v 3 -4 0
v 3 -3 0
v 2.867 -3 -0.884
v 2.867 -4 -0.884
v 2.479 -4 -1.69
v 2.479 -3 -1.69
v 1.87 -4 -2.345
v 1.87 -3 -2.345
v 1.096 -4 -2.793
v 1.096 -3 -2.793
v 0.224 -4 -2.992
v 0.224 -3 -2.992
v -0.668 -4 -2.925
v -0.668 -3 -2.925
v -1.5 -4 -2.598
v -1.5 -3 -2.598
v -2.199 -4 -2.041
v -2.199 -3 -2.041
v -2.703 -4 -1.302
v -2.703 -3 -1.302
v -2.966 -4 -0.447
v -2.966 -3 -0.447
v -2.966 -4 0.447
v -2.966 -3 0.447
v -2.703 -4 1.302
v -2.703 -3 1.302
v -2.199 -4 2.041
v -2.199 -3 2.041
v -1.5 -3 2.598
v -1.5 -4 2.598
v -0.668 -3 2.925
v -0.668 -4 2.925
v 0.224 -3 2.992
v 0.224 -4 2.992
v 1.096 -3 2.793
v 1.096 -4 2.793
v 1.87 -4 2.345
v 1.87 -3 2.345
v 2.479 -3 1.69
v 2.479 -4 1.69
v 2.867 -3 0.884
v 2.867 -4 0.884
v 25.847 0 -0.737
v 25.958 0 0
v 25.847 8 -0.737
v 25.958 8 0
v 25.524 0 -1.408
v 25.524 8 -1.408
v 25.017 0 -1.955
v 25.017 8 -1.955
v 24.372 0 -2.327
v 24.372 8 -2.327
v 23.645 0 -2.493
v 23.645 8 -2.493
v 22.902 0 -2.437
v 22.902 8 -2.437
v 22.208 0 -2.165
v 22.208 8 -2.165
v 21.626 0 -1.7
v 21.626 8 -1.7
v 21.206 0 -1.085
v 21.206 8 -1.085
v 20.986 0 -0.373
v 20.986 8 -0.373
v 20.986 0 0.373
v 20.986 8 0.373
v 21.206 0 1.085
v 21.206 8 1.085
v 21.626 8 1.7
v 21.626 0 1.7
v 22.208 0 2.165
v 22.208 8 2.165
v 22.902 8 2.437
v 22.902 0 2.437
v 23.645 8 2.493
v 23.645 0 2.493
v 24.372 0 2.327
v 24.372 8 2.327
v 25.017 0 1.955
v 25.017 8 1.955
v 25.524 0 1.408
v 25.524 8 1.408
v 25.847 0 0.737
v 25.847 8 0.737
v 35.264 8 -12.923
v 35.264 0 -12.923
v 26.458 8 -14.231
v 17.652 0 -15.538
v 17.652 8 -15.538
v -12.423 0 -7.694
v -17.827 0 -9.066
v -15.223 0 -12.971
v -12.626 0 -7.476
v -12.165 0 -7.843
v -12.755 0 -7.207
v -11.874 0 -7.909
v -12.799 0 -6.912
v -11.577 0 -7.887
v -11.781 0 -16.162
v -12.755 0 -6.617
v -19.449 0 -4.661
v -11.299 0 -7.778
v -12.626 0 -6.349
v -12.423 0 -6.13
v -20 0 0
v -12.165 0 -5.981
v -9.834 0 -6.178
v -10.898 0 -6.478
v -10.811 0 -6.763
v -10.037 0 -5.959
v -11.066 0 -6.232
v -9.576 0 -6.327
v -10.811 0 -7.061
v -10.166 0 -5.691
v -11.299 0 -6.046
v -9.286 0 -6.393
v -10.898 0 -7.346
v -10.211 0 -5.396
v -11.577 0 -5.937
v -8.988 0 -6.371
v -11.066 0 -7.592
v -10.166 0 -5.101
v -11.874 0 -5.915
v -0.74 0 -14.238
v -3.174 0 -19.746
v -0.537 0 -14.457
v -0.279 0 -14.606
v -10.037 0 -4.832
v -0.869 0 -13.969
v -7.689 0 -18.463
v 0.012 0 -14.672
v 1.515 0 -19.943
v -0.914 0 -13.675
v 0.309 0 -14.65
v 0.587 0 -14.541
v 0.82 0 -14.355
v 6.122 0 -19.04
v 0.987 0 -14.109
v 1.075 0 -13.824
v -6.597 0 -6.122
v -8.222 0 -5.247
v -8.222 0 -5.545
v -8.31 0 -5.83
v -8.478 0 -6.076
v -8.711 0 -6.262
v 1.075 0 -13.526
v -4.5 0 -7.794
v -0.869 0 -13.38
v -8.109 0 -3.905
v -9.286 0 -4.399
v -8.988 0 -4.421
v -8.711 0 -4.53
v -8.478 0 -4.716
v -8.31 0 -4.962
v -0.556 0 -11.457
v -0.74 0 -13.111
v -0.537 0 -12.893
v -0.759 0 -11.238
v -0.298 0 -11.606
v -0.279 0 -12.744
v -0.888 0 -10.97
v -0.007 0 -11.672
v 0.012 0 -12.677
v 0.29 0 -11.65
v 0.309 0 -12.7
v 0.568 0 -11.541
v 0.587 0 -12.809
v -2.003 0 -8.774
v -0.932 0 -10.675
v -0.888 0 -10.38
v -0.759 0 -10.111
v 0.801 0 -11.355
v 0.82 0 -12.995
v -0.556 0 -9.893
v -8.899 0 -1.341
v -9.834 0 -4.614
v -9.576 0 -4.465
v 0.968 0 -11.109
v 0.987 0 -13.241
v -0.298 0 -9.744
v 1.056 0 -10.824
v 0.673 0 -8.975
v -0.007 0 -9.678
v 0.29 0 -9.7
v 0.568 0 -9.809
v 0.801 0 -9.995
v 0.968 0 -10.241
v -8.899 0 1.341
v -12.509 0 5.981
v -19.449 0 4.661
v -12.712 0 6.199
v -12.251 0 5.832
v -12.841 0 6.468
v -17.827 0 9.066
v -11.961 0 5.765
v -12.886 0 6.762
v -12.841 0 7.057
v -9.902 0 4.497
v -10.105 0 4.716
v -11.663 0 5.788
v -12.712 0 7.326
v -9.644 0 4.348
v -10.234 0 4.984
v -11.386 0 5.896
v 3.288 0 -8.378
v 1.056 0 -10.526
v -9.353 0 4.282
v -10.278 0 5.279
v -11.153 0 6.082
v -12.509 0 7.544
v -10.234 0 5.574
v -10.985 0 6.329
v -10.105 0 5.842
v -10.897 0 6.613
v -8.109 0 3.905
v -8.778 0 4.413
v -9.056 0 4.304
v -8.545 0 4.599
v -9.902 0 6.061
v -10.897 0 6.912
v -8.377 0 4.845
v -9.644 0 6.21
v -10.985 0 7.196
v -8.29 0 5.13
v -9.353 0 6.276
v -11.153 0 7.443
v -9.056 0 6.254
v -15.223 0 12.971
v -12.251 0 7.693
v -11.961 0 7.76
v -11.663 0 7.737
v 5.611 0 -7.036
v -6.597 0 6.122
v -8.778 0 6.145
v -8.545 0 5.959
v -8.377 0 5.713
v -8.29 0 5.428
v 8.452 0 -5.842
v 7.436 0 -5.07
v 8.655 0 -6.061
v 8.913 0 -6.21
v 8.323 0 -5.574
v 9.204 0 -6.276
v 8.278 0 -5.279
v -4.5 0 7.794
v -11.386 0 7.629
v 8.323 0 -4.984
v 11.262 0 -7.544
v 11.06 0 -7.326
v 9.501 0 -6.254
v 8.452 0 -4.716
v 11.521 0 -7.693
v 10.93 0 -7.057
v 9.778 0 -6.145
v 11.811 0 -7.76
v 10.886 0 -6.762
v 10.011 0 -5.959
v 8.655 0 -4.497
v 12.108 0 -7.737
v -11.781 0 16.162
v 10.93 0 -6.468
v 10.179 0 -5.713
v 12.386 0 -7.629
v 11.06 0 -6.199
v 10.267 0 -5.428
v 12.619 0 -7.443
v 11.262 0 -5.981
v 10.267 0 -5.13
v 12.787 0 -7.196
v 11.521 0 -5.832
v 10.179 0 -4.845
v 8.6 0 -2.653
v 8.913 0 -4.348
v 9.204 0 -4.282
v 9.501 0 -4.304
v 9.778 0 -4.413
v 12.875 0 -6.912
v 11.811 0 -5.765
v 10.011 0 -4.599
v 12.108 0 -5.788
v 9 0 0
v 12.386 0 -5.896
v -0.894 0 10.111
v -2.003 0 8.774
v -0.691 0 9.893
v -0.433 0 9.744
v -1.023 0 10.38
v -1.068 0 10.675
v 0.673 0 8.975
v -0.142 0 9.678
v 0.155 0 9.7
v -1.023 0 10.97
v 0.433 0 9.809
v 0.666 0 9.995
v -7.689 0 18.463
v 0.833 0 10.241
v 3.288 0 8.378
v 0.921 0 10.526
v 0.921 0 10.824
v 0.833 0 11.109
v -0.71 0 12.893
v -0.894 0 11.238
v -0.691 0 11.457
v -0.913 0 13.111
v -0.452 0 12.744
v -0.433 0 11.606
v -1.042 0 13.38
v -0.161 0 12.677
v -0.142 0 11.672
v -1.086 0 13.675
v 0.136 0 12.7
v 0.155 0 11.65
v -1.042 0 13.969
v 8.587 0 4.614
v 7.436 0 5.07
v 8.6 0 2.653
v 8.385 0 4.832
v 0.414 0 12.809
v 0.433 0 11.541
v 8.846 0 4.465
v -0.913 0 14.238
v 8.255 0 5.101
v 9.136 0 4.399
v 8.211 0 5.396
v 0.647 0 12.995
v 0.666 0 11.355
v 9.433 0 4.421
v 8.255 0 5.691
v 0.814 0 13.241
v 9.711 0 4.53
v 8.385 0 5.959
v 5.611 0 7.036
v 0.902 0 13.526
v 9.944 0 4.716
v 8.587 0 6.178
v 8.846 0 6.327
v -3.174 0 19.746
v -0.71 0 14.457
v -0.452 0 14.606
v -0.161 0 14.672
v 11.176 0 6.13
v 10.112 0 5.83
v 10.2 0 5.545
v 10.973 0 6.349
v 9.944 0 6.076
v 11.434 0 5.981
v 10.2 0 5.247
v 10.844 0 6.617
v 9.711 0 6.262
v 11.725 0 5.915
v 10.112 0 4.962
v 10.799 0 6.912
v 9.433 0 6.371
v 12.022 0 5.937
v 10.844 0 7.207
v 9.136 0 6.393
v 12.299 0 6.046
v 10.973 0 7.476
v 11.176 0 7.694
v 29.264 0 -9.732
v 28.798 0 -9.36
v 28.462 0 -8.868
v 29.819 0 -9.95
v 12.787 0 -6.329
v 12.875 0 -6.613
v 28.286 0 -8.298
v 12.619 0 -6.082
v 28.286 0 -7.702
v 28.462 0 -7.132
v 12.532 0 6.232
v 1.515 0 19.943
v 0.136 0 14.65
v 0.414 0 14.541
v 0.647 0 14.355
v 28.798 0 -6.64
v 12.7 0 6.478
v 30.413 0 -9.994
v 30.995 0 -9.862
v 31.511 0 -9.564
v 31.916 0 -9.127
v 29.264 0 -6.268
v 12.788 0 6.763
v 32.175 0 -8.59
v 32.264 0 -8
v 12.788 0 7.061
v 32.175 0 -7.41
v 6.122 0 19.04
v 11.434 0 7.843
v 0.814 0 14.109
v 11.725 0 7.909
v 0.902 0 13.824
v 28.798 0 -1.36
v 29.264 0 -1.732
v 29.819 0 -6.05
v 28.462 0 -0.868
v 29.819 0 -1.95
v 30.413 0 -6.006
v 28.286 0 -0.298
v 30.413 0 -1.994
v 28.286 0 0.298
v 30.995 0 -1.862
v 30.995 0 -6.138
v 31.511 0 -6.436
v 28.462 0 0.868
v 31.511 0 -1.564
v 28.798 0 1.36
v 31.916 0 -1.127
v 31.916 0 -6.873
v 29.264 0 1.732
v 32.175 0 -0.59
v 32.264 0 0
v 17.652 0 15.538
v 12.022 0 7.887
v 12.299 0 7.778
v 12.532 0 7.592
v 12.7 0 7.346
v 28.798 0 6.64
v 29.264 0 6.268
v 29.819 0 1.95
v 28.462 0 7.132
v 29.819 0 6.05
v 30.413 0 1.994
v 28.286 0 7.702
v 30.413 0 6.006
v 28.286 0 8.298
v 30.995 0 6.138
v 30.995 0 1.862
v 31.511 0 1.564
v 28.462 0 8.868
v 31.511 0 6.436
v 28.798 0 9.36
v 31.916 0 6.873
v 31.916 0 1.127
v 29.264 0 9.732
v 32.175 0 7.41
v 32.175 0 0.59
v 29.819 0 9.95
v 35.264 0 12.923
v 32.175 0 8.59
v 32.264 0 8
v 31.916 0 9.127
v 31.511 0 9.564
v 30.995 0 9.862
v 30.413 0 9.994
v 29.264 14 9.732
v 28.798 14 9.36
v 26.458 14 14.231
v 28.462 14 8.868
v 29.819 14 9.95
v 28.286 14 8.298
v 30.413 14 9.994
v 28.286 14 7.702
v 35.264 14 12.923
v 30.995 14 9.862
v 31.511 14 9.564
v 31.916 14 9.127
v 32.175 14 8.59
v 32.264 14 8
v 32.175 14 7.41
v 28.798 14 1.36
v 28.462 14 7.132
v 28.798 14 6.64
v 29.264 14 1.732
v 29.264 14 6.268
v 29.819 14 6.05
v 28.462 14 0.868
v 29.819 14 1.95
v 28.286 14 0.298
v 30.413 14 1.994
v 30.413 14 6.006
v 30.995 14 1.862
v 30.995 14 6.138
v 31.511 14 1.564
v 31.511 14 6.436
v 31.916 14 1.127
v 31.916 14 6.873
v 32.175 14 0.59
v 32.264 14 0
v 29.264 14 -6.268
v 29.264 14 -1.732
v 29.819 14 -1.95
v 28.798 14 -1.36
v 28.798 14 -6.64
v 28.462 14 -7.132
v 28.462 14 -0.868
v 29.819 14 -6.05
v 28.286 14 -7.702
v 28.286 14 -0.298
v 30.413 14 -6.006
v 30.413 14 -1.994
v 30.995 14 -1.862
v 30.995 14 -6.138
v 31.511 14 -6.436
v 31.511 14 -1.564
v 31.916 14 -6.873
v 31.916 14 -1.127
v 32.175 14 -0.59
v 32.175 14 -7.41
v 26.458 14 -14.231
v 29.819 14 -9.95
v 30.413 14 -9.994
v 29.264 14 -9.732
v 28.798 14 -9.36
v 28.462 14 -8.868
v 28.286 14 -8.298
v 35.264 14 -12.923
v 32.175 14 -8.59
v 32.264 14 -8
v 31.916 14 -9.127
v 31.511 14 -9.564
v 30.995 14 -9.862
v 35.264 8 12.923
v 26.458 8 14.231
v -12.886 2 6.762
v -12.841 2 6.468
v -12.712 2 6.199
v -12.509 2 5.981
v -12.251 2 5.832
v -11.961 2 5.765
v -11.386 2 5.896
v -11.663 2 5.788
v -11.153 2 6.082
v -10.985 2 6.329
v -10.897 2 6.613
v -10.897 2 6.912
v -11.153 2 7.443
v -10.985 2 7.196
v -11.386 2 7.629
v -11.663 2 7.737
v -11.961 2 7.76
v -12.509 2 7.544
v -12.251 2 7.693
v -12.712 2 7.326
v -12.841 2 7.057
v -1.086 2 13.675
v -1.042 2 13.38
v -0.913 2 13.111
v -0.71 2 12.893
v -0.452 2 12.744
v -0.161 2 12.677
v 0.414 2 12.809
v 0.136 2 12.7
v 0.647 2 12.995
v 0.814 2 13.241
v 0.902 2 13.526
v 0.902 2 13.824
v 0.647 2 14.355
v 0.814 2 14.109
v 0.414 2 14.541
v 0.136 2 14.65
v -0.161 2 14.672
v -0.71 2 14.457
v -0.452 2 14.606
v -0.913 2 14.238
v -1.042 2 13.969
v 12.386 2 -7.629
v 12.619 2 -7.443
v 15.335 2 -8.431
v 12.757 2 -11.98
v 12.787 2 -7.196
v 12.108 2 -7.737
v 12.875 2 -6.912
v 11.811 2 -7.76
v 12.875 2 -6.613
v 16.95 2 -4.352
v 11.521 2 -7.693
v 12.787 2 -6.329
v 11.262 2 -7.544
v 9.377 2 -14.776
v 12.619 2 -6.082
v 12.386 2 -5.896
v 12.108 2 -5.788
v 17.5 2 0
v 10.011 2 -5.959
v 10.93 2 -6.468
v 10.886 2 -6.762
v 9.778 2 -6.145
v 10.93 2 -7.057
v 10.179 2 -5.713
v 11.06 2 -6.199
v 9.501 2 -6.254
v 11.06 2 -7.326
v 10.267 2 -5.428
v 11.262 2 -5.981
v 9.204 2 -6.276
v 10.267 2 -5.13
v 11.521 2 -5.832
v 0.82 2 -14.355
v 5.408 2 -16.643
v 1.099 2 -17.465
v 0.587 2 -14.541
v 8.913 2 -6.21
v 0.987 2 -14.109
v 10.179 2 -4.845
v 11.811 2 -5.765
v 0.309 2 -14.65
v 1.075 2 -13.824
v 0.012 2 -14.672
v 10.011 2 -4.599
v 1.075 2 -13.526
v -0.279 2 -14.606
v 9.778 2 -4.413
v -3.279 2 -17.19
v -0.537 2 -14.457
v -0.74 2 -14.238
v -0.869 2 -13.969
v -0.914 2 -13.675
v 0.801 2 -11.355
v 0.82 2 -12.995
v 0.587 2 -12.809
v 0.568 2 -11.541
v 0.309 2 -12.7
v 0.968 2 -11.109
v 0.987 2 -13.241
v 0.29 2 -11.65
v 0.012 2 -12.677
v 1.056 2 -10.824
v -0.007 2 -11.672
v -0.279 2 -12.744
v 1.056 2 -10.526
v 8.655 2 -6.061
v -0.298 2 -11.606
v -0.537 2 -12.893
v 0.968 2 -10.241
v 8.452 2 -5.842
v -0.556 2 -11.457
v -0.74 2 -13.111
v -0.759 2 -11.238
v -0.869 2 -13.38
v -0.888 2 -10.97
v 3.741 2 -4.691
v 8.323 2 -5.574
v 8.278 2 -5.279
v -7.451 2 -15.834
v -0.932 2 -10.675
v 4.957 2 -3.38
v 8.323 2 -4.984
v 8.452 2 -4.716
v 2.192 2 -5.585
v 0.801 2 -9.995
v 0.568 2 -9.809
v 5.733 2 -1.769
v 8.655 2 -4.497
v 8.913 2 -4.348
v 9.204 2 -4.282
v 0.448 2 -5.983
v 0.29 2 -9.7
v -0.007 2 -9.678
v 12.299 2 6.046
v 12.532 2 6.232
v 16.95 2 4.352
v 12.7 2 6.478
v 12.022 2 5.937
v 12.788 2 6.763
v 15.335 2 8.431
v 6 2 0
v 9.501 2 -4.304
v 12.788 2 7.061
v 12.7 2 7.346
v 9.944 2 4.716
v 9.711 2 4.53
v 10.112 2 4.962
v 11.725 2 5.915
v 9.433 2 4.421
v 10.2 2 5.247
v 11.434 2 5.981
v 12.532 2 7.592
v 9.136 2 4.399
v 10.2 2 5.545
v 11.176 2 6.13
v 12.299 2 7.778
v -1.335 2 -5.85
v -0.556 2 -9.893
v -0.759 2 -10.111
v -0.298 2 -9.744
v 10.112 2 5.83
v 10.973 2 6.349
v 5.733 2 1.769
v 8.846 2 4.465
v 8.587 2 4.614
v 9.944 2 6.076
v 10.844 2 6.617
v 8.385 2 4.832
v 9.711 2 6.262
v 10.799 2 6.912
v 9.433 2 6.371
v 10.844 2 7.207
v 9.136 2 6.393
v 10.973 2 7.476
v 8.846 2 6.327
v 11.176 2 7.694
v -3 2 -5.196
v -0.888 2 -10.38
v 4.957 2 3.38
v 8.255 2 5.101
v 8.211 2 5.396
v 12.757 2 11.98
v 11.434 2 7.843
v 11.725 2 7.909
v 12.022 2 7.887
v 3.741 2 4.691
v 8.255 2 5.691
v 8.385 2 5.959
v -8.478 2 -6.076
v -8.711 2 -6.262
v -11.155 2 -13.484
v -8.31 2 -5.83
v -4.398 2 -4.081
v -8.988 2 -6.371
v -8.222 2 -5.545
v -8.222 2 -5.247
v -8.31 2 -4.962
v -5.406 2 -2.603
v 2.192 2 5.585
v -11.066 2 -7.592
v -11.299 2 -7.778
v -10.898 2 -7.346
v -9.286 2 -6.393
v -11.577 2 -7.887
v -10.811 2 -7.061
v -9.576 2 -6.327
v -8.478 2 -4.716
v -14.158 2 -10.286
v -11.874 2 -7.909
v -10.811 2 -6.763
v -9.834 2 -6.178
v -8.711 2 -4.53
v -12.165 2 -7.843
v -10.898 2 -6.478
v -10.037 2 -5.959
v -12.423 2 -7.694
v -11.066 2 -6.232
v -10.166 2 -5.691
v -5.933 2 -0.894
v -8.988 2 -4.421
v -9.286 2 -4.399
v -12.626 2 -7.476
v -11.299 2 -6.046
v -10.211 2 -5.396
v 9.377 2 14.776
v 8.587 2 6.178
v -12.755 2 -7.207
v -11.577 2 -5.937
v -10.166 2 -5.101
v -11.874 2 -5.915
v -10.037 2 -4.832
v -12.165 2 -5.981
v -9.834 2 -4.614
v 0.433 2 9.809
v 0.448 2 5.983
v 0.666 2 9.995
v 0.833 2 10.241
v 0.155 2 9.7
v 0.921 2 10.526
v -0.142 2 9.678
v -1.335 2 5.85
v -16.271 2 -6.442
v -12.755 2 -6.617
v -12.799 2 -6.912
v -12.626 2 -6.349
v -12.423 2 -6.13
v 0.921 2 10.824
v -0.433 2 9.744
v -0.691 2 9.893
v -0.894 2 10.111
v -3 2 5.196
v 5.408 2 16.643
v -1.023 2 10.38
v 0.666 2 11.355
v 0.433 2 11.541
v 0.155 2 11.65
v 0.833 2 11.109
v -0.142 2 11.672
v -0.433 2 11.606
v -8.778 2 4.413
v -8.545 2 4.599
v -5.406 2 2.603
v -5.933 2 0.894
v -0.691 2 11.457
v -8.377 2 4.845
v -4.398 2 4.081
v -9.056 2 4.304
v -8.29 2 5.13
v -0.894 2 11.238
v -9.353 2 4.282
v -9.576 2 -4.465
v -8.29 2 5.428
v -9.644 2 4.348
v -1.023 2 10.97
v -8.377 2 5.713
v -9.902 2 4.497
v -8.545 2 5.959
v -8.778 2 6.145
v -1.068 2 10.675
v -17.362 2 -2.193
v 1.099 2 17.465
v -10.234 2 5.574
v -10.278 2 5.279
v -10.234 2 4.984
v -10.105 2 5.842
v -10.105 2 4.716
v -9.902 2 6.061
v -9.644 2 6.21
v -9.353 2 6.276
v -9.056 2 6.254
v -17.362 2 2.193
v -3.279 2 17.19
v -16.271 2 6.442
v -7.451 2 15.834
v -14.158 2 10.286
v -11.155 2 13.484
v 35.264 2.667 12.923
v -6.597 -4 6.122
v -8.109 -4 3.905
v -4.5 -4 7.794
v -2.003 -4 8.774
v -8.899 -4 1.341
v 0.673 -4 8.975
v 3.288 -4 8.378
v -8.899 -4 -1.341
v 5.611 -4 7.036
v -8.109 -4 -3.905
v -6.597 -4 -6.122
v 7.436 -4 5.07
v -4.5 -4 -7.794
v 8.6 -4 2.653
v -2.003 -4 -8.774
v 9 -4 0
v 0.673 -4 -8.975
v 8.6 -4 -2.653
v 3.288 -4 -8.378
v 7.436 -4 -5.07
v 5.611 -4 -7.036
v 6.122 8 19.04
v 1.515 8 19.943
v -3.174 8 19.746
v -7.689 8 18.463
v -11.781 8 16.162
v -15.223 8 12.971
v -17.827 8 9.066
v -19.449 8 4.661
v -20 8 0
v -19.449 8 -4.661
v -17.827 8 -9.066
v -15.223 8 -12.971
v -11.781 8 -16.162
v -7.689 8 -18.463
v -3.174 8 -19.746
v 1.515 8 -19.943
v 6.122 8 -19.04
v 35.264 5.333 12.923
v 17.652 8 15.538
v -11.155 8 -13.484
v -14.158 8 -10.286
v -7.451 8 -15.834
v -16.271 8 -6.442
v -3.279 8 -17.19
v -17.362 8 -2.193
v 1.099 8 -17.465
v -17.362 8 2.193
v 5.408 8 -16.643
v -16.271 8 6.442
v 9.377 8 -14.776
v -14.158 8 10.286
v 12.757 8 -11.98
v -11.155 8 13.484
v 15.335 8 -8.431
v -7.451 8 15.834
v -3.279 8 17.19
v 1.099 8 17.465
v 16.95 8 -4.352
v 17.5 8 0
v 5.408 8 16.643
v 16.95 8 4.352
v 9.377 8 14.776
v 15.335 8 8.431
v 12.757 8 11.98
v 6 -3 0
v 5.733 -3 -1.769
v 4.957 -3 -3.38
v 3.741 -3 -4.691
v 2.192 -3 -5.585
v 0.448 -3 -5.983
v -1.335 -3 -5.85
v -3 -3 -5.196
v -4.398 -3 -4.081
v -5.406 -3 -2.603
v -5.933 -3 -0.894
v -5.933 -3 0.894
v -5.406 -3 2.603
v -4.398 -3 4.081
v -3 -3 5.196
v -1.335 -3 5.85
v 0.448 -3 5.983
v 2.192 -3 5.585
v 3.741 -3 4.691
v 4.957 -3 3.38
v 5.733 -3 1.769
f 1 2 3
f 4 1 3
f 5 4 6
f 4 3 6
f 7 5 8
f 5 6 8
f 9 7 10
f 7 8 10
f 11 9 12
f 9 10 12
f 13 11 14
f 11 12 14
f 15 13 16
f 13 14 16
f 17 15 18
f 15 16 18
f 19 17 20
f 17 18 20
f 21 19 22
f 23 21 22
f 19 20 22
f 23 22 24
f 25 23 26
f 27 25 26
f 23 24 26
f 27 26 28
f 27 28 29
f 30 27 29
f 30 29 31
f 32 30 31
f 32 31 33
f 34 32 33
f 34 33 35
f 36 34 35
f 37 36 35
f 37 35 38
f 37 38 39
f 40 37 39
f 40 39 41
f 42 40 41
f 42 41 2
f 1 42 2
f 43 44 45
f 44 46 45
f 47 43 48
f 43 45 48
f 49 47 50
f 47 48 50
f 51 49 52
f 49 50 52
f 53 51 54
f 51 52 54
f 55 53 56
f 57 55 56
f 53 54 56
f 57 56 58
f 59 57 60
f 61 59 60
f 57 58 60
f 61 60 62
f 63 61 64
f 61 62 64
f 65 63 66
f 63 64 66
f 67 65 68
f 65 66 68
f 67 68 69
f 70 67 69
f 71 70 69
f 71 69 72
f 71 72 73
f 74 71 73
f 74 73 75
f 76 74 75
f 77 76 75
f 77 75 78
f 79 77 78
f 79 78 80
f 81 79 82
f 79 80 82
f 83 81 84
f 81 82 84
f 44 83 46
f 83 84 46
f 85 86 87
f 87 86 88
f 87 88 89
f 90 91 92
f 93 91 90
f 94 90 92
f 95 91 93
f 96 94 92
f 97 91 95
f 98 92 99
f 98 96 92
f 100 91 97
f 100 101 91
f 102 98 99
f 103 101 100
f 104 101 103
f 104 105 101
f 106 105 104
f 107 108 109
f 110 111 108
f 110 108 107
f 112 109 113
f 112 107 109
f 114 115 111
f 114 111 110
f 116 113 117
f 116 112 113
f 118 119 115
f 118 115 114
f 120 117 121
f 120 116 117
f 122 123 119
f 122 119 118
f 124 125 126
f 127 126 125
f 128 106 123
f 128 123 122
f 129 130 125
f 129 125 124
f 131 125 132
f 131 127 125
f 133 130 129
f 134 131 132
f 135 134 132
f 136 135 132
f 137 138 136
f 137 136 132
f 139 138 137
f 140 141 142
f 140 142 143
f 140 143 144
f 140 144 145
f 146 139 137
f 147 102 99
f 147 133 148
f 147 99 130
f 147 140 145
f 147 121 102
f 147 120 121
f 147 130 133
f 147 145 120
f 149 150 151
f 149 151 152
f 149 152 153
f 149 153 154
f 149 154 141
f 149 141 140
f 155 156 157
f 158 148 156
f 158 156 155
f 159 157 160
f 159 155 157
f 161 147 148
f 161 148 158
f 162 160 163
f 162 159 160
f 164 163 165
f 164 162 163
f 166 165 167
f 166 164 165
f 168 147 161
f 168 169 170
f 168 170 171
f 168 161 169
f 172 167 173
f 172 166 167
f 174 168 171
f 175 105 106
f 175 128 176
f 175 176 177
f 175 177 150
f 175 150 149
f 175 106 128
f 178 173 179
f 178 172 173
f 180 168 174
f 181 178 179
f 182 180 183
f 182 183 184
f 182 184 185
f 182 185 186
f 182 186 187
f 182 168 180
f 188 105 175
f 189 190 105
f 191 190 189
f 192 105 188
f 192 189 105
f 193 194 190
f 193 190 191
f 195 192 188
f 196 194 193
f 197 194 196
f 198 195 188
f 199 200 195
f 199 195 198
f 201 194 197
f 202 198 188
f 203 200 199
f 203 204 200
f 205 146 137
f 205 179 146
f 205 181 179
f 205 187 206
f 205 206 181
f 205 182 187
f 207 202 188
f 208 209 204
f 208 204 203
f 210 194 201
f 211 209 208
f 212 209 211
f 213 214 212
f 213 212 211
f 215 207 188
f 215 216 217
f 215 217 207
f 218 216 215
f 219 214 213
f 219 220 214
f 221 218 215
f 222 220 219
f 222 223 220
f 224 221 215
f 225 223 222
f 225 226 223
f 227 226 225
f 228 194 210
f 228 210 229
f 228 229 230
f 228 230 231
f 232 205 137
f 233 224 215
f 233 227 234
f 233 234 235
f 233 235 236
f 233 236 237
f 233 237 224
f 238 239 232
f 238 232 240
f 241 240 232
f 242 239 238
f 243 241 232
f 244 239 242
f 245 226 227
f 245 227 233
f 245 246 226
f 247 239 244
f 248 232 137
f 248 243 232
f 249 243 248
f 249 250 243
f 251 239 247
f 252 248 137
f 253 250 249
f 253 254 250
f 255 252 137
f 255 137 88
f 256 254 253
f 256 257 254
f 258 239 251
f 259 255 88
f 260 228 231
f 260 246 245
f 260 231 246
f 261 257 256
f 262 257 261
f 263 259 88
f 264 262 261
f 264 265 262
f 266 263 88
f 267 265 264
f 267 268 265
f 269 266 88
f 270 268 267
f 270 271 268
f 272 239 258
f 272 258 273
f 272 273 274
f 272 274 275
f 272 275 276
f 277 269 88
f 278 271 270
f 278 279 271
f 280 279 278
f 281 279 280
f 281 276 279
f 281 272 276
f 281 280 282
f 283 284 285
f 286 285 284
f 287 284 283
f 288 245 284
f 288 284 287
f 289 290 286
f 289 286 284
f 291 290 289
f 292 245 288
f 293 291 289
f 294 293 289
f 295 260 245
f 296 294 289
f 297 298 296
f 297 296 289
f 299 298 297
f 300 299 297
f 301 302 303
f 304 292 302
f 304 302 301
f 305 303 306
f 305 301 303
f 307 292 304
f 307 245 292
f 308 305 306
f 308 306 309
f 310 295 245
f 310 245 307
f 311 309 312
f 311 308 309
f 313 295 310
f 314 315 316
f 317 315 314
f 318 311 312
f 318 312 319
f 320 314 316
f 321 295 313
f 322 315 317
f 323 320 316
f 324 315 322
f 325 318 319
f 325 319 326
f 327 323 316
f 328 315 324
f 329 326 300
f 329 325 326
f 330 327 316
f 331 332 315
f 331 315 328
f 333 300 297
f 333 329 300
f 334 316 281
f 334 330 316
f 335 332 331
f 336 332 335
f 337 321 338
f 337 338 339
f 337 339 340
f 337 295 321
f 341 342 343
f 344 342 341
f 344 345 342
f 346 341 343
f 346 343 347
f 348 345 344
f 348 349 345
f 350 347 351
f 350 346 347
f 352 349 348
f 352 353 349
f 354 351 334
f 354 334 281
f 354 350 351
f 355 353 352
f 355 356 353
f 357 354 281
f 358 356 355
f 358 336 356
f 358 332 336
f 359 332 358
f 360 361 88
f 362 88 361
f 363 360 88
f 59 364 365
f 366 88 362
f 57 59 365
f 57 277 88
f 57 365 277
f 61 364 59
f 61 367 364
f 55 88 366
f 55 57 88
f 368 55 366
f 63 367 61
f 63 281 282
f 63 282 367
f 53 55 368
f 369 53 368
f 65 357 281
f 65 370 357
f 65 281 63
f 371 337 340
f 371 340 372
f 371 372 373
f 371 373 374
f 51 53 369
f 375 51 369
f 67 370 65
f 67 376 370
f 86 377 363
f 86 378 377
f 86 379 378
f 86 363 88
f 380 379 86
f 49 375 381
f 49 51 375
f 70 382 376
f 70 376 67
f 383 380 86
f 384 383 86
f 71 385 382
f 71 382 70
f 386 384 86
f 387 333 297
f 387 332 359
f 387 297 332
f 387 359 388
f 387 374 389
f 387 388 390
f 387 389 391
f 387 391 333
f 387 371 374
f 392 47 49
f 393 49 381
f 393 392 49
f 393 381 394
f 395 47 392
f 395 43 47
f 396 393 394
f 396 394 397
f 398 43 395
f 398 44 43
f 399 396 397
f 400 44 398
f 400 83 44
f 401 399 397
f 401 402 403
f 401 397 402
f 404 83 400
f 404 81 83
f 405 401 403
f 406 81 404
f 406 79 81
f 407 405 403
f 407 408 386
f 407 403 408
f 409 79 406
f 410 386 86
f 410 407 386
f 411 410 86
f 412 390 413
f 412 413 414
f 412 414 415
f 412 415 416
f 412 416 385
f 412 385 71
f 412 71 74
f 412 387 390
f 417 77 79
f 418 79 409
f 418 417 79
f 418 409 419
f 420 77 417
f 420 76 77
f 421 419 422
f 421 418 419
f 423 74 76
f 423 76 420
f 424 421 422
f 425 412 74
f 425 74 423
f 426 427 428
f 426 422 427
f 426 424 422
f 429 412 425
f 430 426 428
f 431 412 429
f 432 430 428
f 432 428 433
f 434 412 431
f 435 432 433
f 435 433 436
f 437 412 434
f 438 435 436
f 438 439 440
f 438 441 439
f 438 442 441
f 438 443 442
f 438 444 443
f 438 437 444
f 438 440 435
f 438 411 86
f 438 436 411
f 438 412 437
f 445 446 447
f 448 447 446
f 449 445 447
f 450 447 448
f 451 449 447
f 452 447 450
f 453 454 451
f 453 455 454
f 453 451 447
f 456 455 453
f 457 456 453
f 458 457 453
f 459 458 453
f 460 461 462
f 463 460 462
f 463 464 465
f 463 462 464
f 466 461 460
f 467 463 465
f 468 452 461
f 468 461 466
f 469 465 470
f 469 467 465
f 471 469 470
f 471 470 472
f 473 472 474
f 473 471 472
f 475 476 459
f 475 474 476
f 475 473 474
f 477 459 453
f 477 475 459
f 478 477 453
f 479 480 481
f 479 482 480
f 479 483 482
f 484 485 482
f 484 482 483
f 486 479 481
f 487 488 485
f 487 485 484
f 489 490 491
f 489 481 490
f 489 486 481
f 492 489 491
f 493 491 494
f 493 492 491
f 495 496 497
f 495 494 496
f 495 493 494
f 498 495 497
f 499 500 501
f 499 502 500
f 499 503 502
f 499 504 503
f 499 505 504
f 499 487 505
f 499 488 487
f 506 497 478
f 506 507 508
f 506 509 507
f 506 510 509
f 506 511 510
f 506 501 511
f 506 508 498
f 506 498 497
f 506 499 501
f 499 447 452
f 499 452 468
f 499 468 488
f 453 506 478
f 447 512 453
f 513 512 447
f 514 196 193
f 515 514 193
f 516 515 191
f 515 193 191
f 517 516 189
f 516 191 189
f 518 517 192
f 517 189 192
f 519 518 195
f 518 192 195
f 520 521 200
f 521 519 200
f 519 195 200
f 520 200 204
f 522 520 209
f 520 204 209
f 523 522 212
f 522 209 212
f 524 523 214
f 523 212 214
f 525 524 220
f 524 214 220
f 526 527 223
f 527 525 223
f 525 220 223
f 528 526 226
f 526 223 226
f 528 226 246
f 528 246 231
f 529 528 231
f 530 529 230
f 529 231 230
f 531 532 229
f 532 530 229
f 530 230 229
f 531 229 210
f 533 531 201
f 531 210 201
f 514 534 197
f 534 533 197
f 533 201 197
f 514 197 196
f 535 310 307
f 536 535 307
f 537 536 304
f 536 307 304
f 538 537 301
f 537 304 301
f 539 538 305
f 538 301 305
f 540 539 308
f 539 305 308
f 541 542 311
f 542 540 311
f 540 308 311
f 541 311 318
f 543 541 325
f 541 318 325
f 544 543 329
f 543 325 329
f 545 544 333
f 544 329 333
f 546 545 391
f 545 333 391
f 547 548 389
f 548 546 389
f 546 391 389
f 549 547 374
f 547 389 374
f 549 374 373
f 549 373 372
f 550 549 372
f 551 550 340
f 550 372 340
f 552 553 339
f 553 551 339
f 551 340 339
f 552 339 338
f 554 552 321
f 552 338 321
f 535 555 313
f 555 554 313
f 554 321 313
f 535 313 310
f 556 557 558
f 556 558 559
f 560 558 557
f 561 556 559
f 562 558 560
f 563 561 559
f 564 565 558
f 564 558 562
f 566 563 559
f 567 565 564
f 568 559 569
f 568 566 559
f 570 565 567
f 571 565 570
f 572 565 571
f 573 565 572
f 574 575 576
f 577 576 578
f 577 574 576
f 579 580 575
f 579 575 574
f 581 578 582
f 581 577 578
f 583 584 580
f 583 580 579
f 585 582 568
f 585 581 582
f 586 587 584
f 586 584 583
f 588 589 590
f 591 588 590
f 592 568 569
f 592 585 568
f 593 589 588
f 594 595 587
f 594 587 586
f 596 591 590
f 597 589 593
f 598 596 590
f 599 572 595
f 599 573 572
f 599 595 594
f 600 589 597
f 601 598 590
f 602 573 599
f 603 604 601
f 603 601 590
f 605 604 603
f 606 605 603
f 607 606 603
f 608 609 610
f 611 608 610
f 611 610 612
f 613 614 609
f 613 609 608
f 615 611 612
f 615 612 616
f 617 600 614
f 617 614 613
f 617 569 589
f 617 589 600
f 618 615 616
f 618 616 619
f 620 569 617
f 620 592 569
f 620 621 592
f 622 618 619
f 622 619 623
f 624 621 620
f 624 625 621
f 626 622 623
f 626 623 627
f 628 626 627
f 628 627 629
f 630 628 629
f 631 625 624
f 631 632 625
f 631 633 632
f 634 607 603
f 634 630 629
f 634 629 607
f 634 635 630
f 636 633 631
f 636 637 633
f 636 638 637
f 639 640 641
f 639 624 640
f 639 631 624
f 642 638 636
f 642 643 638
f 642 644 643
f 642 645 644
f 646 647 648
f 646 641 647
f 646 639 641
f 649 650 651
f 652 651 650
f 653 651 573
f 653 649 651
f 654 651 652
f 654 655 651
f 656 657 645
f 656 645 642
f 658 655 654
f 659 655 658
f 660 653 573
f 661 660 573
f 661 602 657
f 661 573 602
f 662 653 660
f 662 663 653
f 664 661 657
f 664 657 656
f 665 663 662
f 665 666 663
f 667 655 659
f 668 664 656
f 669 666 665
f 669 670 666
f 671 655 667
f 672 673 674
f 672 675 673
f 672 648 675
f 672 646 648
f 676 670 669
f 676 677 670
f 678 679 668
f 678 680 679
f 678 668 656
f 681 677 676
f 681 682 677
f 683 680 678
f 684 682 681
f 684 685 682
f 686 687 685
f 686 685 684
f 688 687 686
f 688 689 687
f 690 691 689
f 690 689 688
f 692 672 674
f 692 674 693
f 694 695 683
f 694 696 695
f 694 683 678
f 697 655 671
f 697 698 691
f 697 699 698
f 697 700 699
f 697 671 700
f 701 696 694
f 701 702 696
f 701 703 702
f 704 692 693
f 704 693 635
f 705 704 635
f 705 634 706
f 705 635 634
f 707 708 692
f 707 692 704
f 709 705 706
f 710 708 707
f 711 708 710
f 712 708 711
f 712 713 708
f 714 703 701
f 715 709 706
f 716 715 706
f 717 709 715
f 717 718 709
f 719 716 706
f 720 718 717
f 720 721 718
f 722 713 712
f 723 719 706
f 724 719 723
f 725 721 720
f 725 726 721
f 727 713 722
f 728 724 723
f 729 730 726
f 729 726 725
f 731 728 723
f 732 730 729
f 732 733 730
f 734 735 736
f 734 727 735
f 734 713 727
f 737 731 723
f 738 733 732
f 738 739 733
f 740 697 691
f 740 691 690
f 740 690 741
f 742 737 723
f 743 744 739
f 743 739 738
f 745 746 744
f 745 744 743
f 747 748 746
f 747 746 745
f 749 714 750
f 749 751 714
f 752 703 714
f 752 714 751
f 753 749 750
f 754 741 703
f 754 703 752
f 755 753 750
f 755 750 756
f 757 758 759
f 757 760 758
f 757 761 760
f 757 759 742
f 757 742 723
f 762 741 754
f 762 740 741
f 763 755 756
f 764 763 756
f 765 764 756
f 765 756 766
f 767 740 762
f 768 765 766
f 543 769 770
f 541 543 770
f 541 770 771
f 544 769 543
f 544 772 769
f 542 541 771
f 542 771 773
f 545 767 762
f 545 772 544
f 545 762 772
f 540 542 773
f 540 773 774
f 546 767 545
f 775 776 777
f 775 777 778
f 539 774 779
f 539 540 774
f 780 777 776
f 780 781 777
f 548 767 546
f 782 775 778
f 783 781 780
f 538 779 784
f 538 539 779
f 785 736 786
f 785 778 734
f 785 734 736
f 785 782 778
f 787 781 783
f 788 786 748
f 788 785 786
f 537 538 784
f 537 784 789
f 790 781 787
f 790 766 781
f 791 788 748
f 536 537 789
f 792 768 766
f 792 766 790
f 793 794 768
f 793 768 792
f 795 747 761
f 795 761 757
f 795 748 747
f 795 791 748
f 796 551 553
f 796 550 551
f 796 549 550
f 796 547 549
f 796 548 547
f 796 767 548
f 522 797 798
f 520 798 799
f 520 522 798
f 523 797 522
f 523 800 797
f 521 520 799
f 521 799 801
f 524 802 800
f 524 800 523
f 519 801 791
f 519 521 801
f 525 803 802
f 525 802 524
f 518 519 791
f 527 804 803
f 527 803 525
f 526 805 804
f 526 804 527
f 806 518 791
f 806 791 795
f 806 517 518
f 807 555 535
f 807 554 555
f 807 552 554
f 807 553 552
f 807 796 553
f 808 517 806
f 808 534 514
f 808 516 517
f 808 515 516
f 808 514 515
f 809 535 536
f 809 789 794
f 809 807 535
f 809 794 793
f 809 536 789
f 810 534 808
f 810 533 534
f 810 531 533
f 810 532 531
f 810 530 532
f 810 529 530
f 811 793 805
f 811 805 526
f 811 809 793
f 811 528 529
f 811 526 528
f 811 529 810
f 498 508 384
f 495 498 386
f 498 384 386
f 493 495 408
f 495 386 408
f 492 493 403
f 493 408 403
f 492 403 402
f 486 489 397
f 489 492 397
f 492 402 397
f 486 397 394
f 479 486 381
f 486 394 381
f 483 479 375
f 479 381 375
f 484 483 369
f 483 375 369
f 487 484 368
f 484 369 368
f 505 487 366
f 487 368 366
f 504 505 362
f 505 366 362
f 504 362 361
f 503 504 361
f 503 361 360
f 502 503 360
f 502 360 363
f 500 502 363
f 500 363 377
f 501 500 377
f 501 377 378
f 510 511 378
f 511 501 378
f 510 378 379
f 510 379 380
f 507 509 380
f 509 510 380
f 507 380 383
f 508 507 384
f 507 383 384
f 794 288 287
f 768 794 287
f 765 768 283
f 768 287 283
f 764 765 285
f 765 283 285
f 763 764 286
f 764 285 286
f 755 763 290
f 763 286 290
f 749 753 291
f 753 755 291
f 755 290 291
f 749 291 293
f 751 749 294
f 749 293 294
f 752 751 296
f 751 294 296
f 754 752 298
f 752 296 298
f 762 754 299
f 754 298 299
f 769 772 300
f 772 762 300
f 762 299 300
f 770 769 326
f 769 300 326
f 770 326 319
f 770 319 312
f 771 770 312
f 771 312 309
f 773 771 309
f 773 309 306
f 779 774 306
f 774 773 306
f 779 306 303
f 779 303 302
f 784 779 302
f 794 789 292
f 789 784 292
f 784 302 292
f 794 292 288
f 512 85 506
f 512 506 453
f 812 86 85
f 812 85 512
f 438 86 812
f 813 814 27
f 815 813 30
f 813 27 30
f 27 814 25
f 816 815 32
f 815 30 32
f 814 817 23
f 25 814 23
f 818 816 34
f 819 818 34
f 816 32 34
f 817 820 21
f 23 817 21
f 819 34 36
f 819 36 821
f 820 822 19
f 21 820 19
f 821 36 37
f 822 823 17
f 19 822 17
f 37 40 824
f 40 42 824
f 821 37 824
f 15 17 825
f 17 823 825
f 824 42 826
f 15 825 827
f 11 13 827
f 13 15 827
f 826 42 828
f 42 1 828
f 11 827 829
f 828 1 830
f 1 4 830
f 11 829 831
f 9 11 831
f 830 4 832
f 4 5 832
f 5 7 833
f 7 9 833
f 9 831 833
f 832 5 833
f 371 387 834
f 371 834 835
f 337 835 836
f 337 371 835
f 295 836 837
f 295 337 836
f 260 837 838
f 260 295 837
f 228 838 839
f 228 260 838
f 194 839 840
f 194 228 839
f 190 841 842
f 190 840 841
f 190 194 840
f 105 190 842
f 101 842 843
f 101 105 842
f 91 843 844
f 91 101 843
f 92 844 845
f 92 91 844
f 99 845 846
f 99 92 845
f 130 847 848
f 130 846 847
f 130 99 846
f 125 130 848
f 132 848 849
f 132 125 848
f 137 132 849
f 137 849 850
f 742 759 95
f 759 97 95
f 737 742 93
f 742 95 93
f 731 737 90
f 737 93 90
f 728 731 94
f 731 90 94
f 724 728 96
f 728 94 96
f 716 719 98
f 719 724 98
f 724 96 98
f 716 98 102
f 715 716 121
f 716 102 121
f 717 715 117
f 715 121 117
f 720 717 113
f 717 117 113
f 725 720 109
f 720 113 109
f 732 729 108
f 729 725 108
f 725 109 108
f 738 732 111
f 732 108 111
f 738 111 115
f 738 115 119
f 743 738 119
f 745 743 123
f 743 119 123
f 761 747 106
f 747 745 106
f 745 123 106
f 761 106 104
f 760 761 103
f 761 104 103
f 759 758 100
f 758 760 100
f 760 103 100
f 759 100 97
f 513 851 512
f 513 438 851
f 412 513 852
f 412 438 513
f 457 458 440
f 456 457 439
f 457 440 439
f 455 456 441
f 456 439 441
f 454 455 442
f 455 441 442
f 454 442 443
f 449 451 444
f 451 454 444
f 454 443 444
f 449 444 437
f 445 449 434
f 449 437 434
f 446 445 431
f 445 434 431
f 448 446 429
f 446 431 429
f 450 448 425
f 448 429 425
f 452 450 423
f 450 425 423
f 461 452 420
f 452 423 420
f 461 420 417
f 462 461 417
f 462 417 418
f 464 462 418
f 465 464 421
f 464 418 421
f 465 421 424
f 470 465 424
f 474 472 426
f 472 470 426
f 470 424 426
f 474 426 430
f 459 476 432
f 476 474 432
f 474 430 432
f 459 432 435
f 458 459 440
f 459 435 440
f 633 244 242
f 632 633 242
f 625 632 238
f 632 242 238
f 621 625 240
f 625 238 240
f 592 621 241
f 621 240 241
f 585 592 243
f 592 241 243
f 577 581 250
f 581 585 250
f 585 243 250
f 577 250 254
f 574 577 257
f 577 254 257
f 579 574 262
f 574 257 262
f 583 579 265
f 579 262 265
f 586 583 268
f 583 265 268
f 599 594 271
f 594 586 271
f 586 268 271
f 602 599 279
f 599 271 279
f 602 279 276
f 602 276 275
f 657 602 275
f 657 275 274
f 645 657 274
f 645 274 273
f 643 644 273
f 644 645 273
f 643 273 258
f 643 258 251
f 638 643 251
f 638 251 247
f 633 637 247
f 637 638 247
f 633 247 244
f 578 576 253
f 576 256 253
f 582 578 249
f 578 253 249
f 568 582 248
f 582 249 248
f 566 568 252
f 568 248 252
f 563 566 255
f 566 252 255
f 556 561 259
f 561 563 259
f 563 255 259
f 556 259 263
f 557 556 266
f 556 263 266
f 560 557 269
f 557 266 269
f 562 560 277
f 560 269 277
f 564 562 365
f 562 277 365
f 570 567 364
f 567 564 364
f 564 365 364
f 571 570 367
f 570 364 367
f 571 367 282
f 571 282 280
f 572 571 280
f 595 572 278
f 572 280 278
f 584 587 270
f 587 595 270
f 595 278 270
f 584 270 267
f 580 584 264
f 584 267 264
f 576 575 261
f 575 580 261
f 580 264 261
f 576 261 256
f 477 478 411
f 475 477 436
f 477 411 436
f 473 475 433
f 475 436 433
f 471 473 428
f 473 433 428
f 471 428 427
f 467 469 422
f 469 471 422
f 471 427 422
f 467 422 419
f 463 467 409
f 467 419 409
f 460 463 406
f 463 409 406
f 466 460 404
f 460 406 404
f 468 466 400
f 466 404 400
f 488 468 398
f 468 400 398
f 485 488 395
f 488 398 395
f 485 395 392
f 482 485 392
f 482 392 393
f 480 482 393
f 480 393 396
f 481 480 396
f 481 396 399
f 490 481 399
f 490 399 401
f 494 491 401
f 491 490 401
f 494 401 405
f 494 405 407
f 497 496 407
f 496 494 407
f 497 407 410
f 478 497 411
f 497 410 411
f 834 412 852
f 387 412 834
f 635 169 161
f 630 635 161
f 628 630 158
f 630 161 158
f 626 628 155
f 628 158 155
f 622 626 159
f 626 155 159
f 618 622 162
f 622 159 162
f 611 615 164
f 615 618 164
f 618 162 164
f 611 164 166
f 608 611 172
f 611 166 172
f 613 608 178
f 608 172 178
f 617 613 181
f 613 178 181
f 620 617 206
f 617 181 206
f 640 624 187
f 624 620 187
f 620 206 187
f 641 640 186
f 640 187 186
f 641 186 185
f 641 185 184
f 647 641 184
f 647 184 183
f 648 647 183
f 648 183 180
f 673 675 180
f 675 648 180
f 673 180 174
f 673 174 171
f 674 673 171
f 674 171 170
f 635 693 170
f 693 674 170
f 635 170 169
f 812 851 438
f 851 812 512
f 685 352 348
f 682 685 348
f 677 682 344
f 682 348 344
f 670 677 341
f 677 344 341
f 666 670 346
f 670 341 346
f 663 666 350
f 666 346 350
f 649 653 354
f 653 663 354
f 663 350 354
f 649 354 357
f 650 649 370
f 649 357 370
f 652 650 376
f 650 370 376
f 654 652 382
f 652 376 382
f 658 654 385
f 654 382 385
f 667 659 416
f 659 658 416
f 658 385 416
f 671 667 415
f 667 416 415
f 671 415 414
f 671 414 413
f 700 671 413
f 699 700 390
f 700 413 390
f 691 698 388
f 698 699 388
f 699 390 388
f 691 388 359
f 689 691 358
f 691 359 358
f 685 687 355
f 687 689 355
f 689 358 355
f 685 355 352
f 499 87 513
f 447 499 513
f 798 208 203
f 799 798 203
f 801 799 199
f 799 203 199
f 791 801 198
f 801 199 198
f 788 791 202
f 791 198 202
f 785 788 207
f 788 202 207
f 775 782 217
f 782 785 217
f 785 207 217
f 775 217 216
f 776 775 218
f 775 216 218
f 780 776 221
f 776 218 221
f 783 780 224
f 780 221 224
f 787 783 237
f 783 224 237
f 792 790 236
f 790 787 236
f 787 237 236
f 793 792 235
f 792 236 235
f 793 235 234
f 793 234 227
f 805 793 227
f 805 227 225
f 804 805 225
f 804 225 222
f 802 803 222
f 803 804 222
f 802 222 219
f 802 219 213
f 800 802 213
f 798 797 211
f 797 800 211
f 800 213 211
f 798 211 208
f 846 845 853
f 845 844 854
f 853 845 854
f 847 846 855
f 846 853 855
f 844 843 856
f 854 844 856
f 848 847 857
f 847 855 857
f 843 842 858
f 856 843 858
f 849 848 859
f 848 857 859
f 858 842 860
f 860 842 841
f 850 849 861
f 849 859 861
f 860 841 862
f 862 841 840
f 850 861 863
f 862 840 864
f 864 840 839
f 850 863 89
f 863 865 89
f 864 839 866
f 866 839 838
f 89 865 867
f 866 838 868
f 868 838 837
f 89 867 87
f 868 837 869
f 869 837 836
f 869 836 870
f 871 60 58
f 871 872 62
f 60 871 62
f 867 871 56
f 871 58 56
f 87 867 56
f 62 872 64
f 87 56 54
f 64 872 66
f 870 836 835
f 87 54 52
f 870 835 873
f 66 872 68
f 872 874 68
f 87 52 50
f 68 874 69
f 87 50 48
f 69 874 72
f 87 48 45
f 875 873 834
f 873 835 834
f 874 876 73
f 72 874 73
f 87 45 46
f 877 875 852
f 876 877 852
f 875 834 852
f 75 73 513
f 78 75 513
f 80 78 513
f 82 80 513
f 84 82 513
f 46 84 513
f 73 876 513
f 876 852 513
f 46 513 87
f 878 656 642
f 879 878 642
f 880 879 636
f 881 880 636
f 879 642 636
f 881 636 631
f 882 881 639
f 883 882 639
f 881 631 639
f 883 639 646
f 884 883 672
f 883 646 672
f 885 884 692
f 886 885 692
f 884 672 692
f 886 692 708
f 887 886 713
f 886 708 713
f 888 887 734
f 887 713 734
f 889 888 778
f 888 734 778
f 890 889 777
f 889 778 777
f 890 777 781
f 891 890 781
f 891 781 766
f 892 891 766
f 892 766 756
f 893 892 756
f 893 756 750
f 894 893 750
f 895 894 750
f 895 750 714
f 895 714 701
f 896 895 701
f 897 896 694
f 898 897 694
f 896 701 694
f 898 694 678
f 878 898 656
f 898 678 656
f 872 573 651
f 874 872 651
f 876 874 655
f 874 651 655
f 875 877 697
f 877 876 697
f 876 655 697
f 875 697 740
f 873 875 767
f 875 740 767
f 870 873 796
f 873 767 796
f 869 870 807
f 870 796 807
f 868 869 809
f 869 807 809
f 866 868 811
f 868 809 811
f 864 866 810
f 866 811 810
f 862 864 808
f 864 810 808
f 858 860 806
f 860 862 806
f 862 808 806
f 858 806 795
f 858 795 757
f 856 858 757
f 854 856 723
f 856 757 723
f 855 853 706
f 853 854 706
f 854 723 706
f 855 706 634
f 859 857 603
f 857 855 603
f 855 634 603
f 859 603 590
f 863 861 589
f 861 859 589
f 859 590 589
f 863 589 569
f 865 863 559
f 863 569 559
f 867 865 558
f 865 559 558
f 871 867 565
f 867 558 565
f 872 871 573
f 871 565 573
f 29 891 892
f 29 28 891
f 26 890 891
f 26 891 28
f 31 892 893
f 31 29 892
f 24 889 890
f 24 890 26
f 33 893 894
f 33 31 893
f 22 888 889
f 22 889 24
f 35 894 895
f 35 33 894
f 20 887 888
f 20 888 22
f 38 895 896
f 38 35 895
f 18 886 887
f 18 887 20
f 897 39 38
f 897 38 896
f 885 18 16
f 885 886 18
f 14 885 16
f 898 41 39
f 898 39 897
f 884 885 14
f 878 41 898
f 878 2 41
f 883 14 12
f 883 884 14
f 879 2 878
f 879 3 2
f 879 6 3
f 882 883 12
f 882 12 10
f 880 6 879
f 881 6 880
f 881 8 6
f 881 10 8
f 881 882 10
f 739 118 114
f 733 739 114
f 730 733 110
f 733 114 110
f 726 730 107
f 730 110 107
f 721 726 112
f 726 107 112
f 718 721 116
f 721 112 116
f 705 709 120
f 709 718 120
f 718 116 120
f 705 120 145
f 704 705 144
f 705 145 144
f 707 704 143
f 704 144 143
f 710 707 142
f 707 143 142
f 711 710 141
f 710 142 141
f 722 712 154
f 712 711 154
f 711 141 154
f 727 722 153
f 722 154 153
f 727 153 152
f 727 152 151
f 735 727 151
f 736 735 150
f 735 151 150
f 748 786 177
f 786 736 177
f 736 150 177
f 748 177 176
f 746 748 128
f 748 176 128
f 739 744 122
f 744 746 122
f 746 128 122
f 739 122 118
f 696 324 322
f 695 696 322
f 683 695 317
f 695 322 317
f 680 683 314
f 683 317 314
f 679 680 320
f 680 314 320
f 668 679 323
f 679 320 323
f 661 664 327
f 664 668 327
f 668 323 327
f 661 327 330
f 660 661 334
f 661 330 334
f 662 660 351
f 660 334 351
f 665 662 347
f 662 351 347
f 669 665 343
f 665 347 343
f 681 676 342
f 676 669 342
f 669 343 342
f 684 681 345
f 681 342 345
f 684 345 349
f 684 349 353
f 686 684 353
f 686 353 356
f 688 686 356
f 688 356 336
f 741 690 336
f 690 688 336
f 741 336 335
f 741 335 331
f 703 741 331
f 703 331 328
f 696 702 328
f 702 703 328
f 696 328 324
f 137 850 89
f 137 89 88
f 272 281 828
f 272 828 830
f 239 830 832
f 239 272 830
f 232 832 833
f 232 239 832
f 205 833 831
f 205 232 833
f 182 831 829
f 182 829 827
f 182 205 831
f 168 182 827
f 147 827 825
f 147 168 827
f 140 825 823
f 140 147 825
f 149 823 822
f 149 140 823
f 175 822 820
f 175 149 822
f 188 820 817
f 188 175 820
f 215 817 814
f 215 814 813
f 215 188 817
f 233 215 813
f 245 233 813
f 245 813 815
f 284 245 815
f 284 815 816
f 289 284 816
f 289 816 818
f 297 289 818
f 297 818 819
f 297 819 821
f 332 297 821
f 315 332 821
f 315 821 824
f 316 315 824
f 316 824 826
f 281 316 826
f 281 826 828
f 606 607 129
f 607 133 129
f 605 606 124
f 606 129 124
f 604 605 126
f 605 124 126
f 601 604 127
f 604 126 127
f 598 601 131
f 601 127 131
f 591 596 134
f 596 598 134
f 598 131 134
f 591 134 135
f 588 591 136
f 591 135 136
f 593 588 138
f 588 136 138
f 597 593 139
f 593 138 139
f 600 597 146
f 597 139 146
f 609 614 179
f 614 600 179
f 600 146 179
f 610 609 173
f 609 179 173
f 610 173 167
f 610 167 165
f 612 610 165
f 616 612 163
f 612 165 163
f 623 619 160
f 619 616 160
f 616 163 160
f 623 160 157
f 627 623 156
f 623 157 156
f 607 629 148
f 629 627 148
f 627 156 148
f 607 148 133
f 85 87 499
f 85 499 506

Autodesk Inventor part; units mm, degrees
ref_plane "YZ Plane" through (0, 0, 0) normal (1, 0, 0) x (0, 1, 0)
ref_plane "XZ Plane" through (0, 0, 0) normal (0, 1, 0) x (-1, 0, 0)
ref_plane "XY Plane" through (0, 0, 0) normal (0, 0, 1) x (1, 0, 0)
sketch "Эскиз1" plane through (0, 0, 0) normal (0, 1, 0) x (-1, 0, 0)
  arc A0 (13.2517, 5.1196) -> (11.6396, 8.8847) centre (11.8859, 6.7625) ccw
  line L0 (11.6396, 8.8847) -> (3.5765, 5.9707)
  line L1 (3.5765, 5.9707) -> (2.1921, 14.0362)
  arc A1 (2.1921, 14.0362) -> (-1.8746, 14.5225) centre (0.0865, 13.6747) ccw
  line L2 (-1.8746, 14.5225) -> (-3.3825, 6.0827)
  line L3 (-3.3825, 6.0827) -> (-11.0596, 8.9165)
  arc A2 (-11.0596, 8.9165) -> (-13.5142, 5.6378) centre (-11.7994, 6.9122) ccw
  line L4 (-13.5142, 5.6378) -> (-6.959, 0.112)
  line L5 (-6.959, 0.112) -> (-13.2517, -5.1196)
  arc A3 (-13.2517, -5.1196) -> (-11.6396, -8.8847) centre (-11.8859, -6.7625) ccw
  line L6 (-11.6396, -8.8847) -> (-3.5765, -5.9707)
  line L7 (-3.5765, -5.9707) -> (-2.1921, -14.0362)
  arc A4 (-2.1921, -14.0362) -> (1.8746, -14.5225) centre (-0.0865, -13.6747) ccw
  line L8 (1.8746, -14.5225) -> (3.3825, -6.0827)
  line L9 (3.3825, -6.0827) -> (11.0596, -8.9165)
  arc A5 (11.0596, -8.9165) -> (13.5142, -5.6378) centre (11.7994, -6.9122) ccw
  line L10 (13.5142, -5.6378) -> (6.959, -0.112)
  line L11 (6.959, -0.112) -> (13.2517, 5.1196)
  circle A6 centre (6.6709, 3.7954) radius 1
  circle A7 centre (11.8859, 6.7625) radius 1
  circle A8 centre (9.2109, -5.3958) radius 1
  circle A9 centre (-0.0485, -7.6748) radius 1
  circle A10 centre (-0.0865, -13.6747) radius 1
  circle A11 centre (-9.2784, -5.2789) radius 1
  circle A12 centre (-6.6223, 3.8794) radius 1
  circle A13 centre (-11.7994, 6.9122) radius 1
  circle A14 centre (0.0675, 10.6748) radius 1
  circle A15 centre (0, 0) radius 4.75
  circle A16 centre (0.0865, 13.6747) radius 1
  circle A17 centre (0.0485, 7.6748) radius 1
  circle A18 centre (-9.2109, 5.3958) radius 1
  circle A19 centre (-11.8859, -6.7625) radius 1
  circle A20 centre (-6.6709, -3.7954) radius 1
  circle A21 centre (-0.0675, -10.6748) radius 1
  circle A22 centre (11.7994, -6.9122) radius 1
  circle A23 centre (6.6223, -3.8794) radius 1
  circle A24 centre (9.2784, 5.2789) radius 1
  circle A25 centre (0, 0) radius 1.875
  circle A26 centre (0, 0) radius 20
  circle A27 centre (0, 0) radius 17.5
  point P0 (0, 0)
  dimension "d0" = 40
  dimension "d1" = 35
extrude "Выдавливание1" add sketch "Эскиз1" along normal blind 2 contours L11 L10 A5 L9 L8 A4 L7 L6 A3 L5 L4 A2 L3 L2 A1 L1 L0 A0 | A26 | A27
sketch "Эскиз2" plane through (0, 2, 0) normal (0, 1, 0) x (1, 0, 0)
  arc A0 (13.2517, 5.1196) -> (11.6396, 8.8847) centre (11.8859, 6.7625) ccw
  line L0 (11.6396, 8.8847) -> (3.5765, 5.9707)
  line L1 (3.5765, 5.9707) -> (2.1921, 14.0362)
  arc A1 (2.1921, 14.0362) -> (-1.8746, 14.5225) centre (0.0865, 13.6747) ccw
  line L2 (-1.8746, 14.5225) -> (-3.3825, 6.0827)
  line L3 (-3.3825, 6.0827) -> (-11.0596, 8.9165)
  arc A2 (-11.0596, 8.9165) -> (-13.5142, 5.6378) centre (-11.7994, 6.9122) ccw
  line L4 (-13.5142, 5.6378) -> (-6.959, 0.112)
  line L5 (-6.959, 0.112) -> (-13.2517, -5.1196)
  arc A3 (-13.2517, -5.1196) -> (-11.6396, -8.8847) centre (-11.8859, -6.7625) ccw
  line L6 (-11.6396, -8.8847) -> (-3.5765, -5.9707)
  line L7 (-3.5765, -5.9707) -> (-2.1921, -14.0362)
  arc A4 (-2.1921, -14.0362) -> (1.8746, -14.5225) centre (-0.0865, -13.6747) ccw
  line L8 (1.8746, -14.5225) -> (3.3825, -6.0827)
  line L9 (3.3825, -6.0827) -> (11.0596, -8.9165)
  arc A5 (11.0596, -8.9165) -> (13.5142, -5.6378) centre (11.7994, -6.9122) ccw
  line L10 (13.5142, -5.6378) -> (6.959, -0.112)
  line L11 (6.959, -0.112) -> (13.2517, 5.1196)
  circle A6 centre (6.6709, 3.7954) radius 1
  circle A7 centre (11.8859, 6.7625) radius 1
  circle A8 centre (9.2109, -5.3958) radius 1
  circle A9 centre (-0.0485, -7.6748) radius 1
  circle A10 centre (-0.0865, -13.6747) radius 1
  circle A11 centre (-9.2784, -5.2789) radius 1
  circle A12 centre (-6.6223, 3.8794) radius 1
  circle A13 centre (-11.7994, 6.9122) radius 1
  circle A14 centre (0.0675, 10.6748) radius 1
  circle A15 centre (0, 0) radius 4.75
  circle A16 centre (0.0865, 13.6747) radius 1
  circle A17 centre (0.0485, 7.6748) radius 1
  circle A18 centre (-9.2109, 5.3958) radius 1
  circle A19 centre (-11.8859, -6.7625) radius 1
  circle A20 centre (-6.6709, -3.7954) radius 1
  circle A21 centre (-0.0675, -10.6748) radius 1
  circle A22 centre (11.7994, -6.9122) radius 1
  circle A23 centre (6.6223, -3.8794) radius 1
  circle A24 centre (9.2784, 5.2789) radius 1
  circle A25 centre (0, 0) radius 1.875
  circle A26 centre (0, 0) radius 20
  circle A27 centre (0, 0) radius 17.5
  point P0 (0, 0)
  dimension "d4" = 40
  dimension "d5" = 35
extrude "Выдавливание2" add sketch "Эскиз2" along normal blind 6 contours A26
sketch "Эскиз3" plane through (0, 0, 0) normal (0, -1, 0) x (1, 0, 0)
  circle A0 centre (0, 0) radius 20 projected
  line L0 (15.264, 12.9232) -> (15.264, -12.9232)
  line L1 (15.264, 12.9232) -> (35.264, 12.9232)
  line L2 (35.264, 12.9232) -> (35.264, -12.9232)
  line L3 (35.264, -12.9232) -> (15.264, -12.9232)
  line L4 (15.264, -12.9232) -> (15.264, 12.9232)
  dimension "d8" = 20
extrude "Выдавливание3" add sketch "Эскиз3" against normal up to surface (8 mm away) contours A0 L1 L2 L3
sketch "Эскиз4" plane through (0, 0, 0) normal (0, -1, 0) x (1, 0, 0)
  line L0 (35.264, 0) -> (30.264, 0)
  circle A0 centre (30.264, 0) radius 2
  point P0 (0, 0)
  dimension "d17" = 5
  dimension "d18" = 4
extrude "Выдавливание4" cut sketch "Эскиз4" against normal through all
pattern_linear "Прямоуг.массив2" count 3 spacing 8 along (0, 0, 1) of "Выдавливание4" first direction both ways yes
chamfer "Фаска3" distance 11 angle 45 2 edges at (15.264, 4, -12.9232) (15.264, 4, 12.9232)
chamfer "Фаска4" distance 9 angle 45 2 edges at (26.264, 4, 12.9232) (26.264, 4, -12.9232)
sketch "Эскиз8" plane through (0, 8, 0) normal (0, 1, 0) x (1, 0, 0)
  line L0 (17.6524, 15.5384) -> (35.264, 12.9232) projected
  line L1 (35.264, 12.9232) -> (35.264, -12.9232) projected
  line L2 (35.264, -12.9232) -> (17.6524, -15.5384) projected
  line L3 (35.264, 12.9232) -> (17.6524, 15.5384) projected
  line L4 (26.4582, 14.2308) -> (26.4582, -14.2308)
  line L5 (17.6524, -15.5384) -> (35.264, -12.9232) projected
  circle A0 centre (30.264, 8) radius 2 projected
  circle A1 centre (30.264, 0) radius 2 projected
  circle A2 centre (30.264, -8) radius 2 projected
  point P0 (0, 0)
extrude "Выдавливание8" add sketch "Эскиз8" along normal blind 6
sketch "Эскиз9" plane through (0, 2, 0) normal (0, 1, 0) x (1, 0, 0)
  circle A0 centre (0, 0) radius 9
  dimension "d44" = 18
extrude "Выдавливание9" add sketch "Эскиз9" against normal blind 6
sketch "Эскиз10" plane through (0, 2, 0) normal (0, 1, 0) x (1, 0, 0)
  circle A0 centre (0, 0) radius 3
  dimension "d48" = 6
extrude "Выдавливание10" cut sketch "Эскиз10" against normal through all
sketch "Эскиз11" plane through (0, 2, 0) normal (0, 1, 0) x (1, 0, 0)
  circle A0 centre (0, 0) radius 6
  dimension "d52" = 12
extrude "Выдавливание11" cut sketch "Эскиз11" against normal blind 5
sketch "Эскиз12" plane through (0, 8, 0) normal (0, 1, 0) x (1, 0, 0)
  line L0 (26.4582, 14.2308) -> (26.4582, -14.2308) projected
  line L1 (26.4582, 0) -> (23.4582, 0)
  circle A0 centre (23.4582, 0) radius 2.5
  point P0 (0, 0)
  dimension "d56" = 3
  dimension "d57" = 5
extrude "Выдавливание12" cut sketch "Эскиз12" against normal through all
properties part number "000.403 - Рычаг" material "Пластик АБС"
